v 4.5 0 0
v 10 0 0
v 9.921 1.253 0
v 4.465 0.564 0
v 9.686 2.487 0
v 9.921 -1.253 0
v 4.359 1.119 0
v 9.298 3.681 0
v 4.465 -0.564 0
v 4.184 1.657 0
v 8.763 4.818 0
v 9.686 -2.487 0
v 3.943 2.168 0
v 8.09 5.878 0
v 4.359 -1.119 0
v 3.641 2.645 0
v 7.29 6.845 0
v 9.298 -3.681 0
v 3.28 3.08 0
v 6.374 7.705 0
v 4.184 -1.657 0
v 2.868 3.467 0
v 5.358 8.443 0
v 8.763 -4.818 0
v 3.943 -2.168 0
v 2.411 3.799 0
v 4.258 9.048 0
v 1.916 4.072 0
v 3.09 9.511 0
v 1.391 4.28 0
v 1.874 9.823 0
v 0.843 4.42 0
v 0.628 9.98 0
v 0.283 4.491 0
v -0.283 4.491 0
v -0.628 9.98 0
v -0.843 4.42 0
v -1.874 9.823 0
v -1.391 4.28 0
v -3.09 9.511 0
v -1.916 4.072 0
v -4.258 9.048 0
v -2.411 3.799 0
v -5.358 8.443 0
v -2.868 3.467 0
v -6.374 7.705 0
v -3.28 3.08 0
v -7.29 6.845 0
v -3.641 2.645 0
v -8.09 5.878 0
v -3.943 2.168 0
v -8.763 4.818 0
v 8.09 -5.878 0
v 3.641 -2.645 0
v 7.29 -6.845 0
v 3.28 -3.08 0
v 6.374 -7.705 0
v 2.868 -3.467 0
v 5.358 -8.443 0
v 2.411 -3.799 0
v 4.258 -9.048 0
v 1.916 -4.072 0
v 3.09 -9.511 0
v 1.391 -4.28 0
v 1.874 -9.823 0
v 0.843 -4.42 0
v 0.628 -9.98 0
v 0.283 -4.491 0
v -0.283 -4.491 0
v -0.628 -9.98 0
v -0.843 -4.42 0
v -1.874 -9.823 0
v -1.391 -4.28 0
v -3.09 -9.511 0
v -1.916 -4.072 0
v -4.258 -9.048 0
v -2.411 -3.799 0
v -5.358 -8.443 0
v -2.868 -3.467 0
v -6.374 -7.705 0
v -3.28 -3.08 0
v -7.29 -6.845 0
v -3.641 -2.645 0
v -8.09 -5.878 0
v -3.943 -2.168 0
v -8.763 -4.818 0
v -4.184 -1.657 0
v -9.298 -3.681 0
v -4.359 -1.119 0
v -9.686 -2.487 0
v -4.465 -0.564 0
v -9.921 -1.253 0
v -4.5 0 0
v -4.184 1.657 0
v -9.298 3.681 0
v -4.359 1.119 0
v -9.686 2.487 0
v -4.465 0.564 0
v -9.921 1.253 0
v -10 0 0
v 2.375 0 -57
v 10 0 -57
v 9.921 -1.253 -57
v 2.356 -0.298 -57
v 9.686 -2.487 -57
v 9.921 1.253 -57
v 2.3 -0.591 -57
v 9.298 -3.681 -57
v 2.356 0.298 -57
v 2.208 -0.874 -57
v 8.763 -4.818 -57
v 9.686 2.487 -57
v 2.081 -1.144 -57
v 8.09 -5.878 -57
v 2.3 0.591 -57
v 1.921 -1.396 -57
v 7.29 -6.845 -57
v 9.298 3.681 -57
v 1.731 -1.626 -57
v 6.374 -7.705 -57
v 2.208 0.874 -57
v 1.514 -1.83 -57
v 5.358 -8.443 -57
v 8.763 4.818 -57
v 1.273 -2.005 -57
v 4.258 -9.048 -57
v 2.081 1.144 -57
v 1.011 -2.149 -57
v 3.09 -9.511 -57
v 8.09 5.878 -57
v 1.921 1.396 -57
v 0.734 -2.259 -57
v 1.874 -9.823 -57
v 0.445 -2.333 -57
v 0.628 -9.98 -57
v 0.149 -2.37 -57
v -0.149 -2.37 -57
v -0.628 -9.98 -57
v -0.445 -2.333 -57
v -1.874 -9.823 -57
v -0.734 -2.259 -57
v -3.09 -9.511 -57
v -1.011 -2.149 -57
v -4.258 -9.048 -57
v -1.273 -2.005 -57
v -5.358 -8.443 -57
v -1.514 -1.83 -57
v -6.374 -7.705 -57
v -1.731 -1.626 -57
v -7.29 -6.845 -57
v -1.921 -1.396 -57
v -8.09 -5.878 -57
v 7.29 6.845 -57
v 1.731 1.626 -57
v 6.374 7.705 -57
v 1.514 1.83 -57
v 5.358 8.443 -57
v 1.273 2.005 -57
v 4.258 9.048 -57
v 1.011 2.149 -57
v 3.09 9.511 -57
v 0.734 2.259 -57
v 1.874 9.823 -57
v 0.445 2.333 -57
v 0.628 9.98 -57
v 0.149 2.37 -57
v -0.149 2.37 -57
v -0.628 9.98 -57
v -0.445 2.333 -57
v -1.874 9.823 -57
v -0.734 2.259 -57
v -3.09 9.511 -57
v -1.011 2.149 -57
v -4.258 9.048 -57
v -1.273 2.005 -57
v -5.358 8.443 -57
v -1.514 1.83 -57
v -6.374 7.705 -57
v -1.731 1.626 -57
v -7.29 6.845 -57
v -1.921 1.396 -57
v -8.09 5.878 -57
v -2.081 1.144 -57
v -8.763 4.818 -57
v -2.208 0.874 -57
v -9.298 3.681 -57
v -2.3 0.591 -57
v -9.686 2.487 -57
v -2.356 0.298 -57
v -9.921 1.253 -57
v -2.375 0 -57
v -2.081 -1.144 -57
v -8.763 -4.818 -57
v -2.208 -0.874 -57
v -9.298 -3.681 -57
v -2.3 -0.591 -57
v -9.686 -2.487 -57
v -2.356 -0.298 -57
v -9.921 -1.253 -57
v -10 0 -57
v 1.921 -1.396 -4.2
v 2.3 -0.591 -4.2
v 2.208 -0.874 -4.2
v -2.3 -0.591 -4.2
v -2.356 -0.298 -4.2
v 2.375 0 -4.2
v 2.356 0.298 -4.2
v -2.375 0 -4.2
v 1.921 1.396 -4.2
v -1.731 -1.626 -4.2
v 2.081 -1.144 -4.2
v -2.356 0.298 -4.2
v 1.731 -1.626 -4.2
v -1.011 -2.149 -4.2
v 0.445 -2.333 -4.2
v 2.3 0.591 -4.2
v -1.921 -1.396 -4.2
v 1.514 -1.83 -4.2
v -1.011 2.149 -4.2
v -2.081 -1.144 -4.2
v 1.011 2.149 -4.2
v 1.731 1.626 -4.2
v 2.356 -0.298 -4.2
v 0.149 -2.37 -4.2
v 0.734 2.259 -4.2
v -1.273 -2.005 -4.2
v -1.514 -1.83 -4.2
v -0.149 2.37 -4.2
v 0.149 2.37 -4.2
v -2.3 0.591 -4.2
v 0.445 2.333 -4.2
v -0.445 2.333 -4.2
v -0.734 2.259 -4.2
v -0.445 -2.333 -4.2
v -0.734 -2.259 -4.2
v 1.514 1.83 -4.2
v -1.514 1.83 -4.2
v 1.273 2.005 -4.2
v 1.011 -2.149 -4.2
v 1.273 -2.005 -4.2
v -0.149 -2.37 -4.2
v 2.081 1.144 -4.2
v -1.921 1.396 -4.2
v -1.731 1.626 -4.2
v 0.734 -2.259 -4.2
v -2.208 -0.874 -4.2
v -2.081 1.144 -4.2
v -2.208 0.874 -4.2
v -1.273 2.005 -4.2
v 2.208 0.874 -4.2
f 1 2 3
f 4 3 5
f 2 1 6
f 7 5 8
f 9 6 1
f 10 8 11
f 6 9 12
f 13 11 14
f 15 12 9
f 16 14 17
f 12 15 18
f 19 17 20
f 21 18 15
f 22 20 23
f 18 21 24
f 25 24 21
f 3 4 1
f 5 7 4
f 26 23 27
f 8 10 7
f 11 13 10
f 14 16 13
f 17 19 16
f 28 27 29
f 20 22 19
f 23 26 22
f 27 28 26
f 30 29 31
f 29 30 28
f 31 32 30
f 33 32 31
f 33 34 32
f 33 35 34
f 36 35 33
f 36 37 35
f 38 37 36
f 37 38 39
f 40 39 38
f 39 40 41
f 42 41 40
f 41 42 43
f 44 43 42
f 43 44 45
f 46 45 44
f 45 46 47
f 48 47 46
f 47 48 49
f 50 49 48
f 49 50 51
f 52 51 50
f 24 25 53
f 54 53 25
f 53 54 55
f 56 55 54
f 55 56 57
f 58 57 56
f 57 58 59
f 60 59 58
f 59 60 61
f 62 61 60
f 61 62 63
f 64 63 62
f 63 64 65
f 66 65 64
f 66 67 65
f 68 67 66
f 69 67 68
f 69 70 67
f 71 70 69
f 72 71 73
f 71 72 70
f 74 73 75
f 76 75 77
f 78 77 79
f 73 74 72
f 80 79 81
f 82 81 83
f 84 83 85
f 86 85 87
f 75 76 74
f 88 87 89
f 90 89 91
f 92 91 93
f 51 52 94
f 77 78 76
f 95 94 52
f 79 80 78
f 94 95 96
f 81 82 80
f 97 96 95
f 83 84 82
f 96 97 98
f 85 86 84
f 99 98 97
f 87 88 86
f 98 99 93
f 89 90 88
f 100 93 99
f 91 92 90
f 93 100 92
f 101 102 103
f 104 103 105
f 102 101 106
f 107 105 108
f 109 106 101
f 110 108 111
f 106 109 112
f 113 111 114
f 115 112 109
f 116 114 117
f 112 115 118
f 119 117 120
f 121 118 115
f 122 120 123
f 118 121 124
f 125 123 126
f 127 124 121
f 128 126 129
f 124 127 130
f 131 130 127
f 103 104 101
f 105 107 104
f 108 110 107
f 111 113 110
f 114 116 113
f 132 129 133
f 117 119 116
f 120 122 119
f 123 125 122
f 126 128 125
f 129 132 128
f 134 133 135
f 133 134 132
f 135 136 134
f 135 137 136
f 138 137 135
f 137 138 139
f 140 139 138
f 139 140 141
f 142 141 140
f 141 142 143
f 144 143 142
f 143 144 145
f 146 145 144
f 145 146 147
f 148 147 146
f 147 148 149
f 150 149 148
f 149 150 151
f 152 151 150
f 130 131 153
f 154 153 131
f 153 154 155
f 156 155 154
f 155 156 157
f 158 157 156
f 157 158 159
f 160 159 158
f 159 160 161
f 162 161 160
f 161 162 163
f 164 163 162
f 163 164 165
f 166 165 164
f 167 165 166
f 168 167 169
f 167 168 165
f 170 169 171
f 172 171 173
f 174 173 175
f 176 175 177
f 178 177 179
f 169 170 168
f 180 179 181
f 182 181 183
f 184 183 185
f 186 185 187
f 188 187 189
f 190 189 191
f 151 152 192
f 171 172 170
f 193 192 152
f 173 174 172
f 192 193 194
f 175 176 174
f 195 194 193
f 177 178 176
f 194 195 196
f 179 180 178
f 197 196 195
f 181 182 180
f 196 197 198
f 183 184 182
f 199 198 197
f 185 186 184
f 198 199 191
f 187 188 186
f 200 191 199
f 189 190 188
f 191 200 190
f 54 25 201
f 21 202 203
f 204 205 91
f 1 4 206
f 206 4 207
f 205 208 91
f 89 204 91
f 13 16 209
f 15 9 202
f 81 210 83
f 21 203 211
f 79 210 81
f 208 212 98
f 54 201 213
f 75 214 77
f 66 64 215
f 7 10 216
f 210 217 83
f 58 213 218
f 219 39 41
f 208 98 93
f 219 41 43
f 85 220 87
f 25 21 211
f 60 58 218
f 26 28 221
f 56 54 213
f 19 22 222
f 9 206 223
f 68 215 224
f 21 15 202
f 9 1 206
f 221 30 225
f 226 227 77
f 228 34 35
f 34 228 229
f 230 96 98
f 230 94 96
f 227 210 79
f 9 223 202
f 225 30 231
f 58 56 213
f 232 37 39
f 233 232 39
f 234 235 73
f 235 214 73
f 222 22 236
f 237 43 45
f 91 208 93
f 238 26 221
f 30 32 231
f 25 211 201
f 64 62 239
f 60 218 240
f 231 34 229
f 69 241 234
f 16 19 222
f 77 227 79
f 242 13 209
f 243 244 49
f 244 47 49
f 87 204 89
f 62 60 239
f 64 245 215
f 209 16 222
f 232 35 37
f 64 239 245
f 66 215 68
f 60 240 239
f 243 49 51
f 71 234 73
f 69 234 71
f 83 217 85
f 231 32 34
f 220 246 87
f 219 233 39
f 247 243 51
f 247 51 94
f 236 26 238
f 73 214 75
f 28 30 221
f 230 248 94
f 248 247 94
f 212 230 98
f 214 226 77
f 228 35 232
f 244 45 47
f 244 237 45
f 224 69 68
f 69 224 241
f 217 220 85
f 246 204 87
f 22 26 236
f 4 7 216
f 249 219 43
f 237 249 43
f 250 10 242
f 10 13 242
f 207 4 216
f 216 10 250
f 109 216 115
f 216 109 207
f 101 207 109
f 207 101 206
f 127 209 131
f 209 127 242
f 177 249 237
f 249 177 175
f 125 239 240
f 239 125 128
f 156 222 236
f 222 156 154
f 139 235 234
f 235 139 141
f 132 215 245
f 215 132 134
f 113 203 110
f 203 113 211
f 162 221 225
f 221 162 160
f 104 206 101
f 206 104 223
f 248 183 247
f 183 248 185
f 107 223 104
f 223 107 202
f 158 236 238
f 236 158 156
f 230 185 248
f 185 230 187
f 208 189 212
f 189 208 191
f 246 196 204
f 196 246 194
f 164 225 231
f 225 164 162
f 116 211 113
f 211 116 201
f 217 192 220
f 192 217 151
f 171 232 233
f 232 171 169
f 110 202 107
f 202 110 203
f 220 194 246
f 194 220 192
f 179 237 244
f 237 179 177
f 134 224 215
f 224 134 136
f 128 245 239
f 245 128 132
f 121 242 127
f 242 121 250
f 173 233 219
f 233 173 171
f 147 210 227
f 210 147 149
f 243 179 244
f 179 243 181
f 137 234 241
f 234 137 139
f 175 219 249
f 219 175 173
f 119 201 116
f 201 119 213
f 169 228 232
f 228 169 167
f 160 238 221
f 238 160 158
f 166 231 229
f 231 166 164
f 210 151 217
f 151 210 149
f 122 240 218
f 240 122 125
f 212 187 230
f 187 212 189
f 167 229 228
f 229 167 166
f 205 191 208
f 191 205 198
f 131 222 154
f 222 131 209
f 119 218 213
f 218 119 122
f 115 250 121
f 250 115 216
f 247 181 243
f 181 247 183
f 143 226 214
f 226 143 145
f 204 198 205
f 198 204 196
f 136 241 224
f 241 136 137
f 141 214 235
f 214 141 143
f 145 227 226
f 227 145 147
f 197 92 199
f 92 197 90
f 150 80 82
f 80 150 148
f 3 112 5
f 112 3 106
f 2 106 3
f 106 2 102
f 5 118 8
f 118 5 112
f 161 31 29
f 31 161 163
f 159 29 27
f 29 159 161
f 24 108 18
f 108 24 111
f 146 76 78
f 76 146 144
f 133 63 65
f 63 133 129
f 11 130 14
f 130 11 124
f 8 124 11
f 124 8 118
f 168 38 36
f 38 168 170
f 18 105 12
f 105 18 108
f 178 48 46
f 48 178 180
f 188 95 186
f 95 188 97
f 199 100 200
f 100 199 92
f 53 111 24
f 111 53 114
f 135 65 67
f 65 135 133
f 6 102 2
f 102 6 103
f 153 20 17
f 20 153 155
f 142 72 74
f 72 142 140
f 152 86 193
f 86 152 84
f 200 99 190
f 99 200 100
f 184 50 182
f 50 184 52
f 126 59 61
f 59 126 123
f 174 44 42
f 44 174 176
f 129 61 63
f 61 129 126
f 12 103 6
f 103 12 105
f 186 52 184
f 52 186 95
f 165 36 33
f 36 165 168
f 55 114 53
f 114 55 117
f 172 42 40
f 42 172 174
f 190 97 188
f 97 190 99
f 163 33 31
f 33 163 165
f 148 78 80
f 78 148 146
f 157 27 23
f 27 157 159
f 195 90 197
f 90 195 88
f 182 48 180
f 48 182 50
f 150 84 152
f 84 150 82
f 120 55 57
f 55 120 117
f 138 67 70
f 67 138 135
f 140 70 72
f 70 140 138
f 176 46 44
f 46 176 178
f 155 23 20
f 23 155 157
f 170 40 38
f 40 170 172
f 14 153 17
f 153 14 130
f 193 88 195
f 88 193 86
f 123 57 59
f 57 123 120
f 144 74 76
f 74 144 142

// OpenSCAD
$fn = 50;


difference() {
	union() {
		translate(v = [0, 0, -57.0000000000]) {
			cylinder(h = 57, r = 10.0000000000);
		}
		cylinder(h = 0, r = 13.0000000000);
	}
	union() {
		translate(v = [0, 0, 0]) {
			rotate(a = [0, 0, 0]) {
				difference() {
					union() {
						#translate(v = [0, 0, -57.0000000000]) {
							cylinder(h = 57, r = 2.2500000000);
						}
						#translate(v = [0, 0, -4.2000000000]) {
							cylinder(h = 4.2000000000, r1 = 2.3750000000, r2 = 4.5000000000);
						}
						#translate(v = [0, 0, -57.0000000000]) {
							cylinder(h = 57, r = 2.3750000000);
						}
						#translate(v = [0, 0, -57.0000000000]) {
							cylinder(h = 57, r = 2.2500000000);
						}
					}
					union();
				}
			}
		}
	}
}
